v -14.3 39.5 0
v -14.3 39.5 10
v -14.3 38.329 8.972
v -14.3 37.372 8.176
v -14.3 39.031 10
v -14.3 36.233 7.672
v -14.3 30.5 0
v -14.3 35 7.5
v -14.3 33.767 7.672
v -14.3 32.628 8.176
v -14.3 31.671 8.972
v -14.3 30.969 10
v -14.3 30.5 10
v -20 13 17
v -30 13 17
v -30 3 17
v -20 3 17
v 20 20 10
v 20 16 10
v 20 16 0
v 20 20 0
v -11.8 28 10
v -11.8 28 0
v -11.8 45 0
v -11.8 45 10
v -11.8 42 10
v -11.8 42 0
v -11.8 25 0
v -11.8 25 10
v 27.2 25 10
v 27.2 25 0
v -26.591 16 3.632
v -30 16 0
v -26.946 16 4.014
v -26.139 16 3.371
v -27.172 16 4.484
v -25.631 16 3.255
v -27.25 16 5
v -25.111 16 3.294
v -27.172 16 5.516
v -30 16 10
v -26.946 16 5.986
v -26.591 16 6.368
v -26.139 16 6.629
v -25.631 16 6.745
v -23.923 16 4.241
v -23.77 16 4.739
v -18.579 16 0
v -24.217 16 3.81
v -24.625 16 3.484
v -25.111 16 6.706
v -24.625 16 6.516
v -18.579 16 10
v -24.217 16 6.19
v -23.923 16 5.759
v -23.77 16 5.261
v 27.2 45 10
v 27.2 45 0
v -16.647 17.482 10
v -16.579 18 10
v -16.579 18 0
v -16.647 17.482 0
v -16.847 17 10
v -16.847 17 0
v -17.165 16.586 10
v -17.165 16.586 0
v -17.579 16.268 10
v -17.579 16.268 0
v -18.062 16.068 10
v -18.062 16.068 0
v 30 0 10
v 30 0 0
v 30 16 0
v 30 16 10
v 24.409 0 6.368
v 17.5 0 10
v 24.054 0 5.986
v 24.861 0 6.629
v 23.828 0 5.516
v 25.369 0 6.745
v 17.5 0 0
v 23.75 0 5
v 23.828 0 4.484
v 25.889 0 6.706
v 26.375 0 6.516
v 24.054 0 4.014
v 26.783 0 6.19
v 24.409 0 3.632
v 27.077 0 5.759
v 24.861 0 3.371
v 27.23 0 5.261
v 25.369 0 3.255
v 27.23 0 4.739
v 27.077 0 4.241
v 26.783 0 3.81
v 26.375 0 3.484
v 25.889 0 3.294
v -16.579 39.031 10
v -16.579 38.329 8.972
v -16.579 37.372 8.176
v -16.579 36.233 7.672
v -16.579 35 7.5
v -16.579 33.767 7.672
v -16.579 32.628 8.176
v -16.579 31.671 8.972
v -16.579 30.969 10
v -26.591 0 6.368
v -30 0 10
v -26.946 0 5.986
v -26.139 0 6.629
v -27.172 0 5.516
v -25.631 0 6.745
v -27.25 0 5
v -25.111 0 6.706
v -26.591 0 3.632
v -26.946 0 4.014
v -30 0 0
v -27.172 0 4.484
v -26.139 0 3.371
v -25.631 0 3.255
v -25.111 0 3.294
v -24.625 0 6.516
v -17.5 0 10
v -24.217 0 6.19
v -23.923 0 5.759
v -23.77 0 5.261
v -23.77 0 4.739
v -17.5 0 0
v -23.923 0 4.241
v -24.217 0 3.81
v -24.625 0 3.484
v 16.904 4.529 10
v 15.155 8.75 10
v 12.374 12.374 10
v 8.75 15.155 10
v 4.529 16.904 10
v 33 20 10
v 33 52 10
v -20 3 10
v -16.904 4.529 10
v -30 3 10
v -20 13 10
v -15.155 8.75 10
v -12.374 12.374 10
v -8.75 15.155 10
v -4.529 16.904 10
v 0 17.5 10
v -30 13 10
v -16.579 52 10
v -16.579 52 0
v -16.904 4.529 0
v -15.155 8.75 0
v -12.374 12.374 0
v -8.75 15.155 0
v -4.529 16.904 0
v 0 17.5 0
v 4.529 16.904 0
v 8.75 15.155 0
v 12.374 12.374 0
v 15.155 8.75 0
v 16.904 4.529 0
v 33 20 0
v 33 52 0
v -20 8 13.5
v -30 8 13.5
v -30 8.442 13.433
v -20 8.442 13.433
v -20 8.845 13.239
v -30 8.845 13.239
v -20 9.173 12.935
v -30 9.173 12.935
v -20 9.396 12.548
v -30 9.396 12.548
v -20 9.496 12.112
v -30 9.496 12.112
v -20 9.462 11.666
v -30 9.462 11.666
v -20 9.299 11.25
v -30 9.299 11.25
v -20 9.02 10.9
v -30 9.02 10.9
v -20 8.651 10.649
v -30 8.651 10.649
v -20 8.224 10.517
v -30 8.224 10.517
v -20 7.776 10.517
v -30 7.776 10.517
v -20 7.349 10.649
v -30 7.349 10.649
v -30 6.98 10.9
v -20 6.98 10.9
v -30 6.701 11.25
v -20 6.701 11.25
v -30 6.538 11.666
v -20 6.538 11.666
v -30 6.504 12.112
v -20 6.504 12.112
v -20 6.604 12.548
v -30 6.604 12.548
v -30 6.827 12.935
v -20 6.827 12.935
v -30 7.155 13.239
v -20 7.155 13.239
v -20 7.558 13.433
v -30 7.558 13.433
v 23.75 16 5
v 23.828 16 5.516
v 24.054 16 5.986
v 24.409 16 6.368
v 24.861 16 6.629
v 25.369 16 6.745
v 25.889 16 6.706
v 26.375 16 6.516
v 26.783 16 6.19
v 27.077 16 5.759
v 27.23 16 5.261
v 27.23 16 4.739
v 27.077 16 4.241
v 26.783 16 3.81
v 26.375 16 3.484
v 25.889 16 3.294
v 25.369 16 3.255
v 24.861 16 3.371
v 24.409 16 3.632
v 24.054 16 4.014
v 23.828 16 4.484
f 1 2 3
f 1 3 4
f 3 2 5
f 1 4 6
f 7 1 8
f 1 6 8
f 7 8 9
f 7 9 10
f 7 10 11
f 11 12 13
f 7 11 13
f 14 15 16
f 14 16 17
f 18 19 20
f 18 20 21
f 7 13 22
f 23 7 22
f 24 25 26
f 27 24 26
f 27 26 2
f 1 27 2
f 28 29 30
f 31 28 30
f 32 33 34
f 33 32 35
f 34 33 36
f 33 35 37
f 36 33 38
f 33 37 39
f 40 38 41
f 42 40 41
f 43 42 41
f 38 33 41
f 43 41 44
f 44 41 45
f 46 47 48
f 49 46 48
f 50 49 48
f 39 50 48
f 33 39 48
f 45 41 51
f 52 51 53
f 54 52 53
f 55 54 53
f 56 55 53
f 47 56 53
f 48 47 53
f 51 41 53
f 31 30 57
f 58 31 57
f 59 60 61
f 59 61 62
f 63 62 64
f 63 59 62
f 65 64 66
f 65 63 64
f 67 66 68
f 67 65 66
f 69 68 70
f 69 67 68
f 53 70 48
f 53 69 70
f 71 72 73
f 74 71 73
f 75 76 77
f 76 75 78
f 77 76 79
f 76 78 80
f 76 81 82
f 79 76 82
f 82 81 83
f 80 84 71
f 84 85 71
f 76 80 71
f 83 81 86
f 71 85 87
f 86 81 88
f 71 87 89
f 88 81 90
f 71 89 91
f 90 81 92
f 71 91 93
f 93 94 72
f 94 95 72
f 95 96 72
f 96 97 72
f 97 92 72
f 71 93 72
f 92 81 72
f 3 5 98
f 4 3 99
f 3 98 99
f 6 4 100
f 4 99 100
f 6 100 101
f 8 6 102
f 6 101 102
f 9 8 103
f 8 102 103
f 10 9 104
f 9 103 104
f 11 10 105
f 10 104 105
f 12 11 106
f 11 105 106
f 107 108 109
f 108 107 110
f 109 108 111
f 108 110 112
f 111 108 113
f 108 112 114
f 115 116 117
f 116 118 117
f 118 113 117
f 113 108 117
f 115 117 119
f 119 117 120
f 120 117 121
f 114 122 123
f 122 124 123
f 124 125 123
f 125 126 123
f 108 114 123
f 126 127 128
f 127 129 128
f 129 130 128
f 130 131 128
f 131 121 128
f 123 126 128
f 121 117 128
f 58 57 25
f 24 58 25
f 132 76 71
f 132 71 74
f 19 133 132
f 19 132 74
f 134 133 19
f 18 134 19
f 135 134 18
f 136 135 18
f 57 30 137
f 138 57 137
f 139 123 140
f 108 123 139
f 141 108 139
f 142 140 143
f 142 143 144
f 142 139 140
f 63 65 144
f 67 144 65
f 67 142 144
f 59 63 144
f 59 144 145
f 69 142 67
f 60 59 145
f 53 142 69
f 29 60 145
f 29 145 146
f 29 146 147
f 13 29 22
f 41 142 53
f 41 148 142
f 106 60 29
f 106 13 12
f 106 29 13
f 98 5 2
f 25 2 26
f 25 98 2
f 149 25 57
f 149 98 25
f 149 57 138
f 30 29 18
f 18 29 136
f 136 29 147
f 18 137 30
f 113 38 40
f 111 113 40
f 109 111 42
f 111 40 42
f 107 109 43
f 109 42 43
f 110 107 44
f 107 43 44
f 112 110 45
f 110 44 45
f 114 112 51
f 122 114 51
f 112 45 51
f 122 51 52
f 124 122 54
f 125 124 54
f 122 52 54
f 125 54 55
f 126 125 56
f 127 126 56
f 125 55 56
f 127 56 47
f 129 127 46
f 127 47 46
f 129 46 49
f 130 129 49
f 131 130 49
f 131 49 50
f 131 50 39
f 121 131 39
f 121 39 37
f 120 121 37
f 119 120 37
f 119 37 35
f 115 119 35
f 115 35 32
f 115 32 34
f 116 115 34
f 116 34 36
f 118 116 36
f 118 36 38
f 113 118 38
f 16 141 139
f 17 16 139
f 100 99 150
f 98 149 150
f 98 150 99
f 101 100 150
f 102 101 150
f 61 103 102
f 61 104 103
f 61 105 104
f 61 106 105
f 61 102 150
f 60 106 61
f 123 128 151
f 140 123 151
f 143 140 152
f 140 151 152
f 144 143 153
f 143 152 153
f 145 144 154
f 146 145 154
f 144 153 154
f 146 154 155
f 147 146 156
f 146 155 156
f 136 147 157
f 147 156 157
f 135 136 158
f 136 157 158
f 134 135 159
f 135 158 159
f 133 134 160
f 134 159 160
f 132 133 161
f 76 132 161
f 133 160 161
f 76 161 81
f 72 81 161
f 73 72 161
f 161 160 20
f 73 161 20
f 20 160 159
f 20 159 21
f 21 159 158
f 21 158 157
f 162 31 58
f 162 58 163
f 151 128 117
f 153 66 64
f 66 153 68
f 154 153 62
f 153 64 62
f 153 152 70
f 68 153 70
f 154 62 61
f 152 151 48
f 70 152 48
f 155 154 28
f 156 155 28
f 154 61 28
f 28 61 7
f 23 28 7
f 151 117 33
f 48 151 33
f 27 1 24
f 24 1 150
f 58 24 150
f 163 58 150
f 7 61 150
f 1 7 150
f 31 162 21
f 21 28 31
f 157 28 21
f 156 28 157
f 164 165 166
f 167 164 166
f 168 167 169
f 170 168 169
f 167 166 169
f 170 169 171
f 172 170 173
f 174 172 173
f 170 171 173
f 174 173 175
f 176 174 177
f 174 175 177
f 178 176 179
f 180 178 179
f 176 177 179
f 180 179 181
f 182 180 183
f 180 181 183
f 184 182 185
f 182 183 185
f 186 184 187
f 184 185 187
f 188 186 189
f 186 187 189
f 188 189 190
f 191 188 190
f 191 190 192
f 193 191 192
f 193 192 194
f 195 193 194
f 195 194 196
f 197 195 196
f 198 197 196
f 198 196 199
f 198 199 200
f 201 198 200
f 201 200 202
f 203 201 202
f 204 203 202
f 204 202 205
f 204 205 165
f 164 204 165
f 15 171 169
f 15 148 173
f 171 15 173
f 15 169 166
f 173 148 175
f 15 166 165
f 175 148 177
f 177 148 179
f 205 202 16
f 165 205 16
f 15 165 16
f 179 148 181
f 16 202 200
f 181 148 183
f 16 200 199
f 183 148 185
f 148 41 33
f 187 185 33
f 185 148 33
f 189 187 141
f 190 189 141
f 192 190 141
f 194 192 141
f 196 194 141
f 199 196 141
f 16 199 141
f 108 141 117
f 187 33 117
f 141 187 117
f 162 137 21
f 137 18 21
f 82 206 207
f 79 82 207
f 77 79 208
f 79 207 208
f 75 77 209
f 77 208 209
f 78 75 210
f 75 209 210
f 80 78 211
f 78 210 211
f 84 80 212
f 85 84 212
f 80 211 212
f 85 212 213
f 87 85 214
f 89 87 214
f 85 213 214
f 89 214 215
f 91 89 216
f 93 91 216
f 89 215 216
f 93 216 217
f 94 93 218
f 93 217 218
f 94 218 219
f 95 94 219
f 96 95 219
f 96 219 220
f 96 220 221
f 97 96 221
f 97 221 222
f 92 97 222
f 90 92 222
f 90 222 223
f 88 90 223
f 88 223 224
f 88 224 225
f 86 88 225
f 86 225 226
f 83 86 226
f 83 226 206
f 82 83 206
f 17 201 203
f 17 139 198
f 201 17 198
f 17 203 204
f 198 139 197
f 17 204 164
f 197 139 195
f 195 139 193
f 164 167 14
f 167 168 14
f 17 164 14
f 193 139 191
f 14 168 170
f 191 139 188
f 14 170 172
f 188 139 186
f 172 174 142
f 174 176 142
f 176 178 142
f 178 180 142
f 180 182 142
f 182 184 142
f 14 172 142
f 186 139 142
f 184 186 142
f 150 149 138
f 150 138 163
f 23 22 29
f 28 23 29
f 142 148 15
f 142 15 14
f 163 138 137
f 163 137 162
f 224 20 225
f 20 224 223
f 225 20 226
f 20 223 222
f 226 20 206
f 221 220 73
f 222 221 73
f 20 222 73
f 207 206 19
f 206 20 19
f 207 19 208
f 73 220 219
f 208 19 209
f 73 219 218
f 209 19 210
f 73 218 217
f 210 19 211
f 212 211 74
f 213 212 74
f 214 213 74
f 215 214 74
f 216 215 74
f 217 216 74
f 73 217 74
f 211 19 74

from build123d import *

# Parameters (mm, degrees)
Y_KSEKLIK_EKSTR_ZYON1_DEPTH = 10
CUT_EXTRUDE1_REACH          = 62.86
SKETCH1_W                   = 10
SKETCH1_H                   = 4
SKETCH1_H_2                 = 36
CUT_EXTRUDE2_REACH          = 49.917
SKETCH2_R                   = 1.75
SKETCH3_W                   = 10
SKETCH3_H                   = 10
BOSS_EXTRUDE1_DEPTH         = 7
CUT_EXTRUDE3_REACH          = 83.197
SKETCH4_R                   = 1.5
CUT_EXTRUDE4_REACH          = 62.86
CUT_EXTRUDE5_REACH          = 73.851
SKETCH7_R                   = 4.5
SKETCH8_W                   = 10
SKETCH8_H                   = 32
BOSS_EXTRUDE2_DEPTH         = 3


with BuildPart() as part:
    # Çizim1 → Yükseklik-Ekstrüzyon1 (new body)
    with BuildSketch(Plane.XY):
        with BuildLine():
            Line((-30, 0), (-17.5, 0))
            ThreePointArc((-17.5, 0), (0, 17.5), (17.5, 0))
            Line((17.5, 0), (30, 0))
            Line((30, 0), (30, 52))
            Line((30, 52), (-30, 52))
            Line((-30, 52), (-30, 0))
        make_face()
    extrude(amount=Y_KSEKLIK_EKSTR_ZYON1_DEPTH)

    # Sketch1 → Cut-Extrude1 (cut, up to next)
    with BuildSketch(Plane.XY.offset(10), mode=Mode.PRIVATE) as cut_extrude1_sk1:
        with Locations((25, 18)):
            Rectangle(SKETCH1_W, SKETCH1_H)
    cut_extrude1_tool1 = extrude(cut_extrude1_sk1.sketch, amount=-CUT_EXTRUDE1_REACH, mode=Mode.PRIVATE) & part.part
    # Sketch1 → Cut-Extrude1 (cut, up to next)
    with BuildSketch(Plane.XY.offset(10), mode=Mode.PRIVATE) as cut_extrude1_sk2:
        with Locations((-25, 34)):
            Rectangle(SKETCH1_W, SKETCH1_H_2)
    cut_extrude1_tool2 = extrude(cut_extrude1_sk2.sketch, amount=-CUT_EXTRUDE1_REACH, mode=Mode.PRIVATE) & part.part
    add(cut_extrude1_tool1.solids().sort_by_distance((25, 18, 10))[0], mode=Mode.SUBTRACT)
    add(cut_extrude1_tool2.solids().sort_by_distance((-25, 34, 10))[0], mode=Mode.SUBTRACT)

    # Sketch2 → Cut-Extrude2 (cut, up to next)
    with BuildSketch(Plane(origin=(0, 16, 0), x_dir=(1, 0, 0), z_dir=(0, 1, 0)), mode=Mode.PRIVATE) as cut_extrude2_sk1:
        with Locations(Location((-25.5, -5, 0), (0, 0, 180))):
            Circle(SKETCH2_R)
    cut_extrude2_tool1 = extrude(cut_extrude2_sk1.sketch, amount=-CUT_EXTRUDE2_REACH, mode=Mode.PRIVATE) & part.part
    # Sketch2 → Cut-Extrude2 (cut, up to next)
    with BuildSketch(Plane(origin=(0, 16, 0), x_dir=(1, 0, 0), z_dir=(0, 1, 0)), mode=Mode.PRIVATE) as cut_extrude2_sk2:
        with Locations(Location((25.5, -5, 0), (0, 0, 180))):
            Circle(SKETCH2_R)
    cut_extrude2_tool2 = extrude(cut_extrude2_sk2.sketch, amount=-CUT_EXTRUDE2_REACH, mode=Mode.PRIVATE) & part.part
    add(cut_extrude2_tool1.solids().sort_by_distance((-25.5, 16, 5))[0], mode=Mode.SUBTRACT)
    add(cut_extrude2_tool2.solids().sort_by_distance((25.5, 16, 5))[0], mode=Mode.SUBTRACT)

    # Sketch3 → Boss-Extrude1 (add)
    with BuildSketch(Plane.XY.offset(10)):
        with Locations((-25, 8)):
            Rectangle(SKETCH3_W, SKETCH3_H)
    extrude(amount=BOSS_EXTRUDE1_DEPTH)

    # Sketch4 → Cut-Extrude3 (cut, up to next)
    with BuildSketch(Plane.ZY.offset(30), mode=Mode.PRIVATE) as cut_extrude3_sk1:
        with Locations((12, 8)):
            Circle(SKETCH4_R)
    cut_extrude3_tool1 = extrude(cut_extrude3_sk1.sketch, amount=-CUT_EXTRUDE3_REACH, mode=Mode.PRIVATE) & part.part
    add(cut_extrude3_tool1.solids().sort_by_distance((-30, 8, 12))[0], mode=Mode.SUBTRACT)

    # Sketch6 → Cut-Extrude4 (cut, up to next)
    with BuildSketch(Plane.XY.offset(10), mode=Mode.PRIVATE) as cut_extrude4_sk1:
        with BuildLine():
            Line((-20, 52), (-16.579251378, 52))
            Line((-16.579251378, 52), (-16.579251378, 18))
            ThreePointArc((-16.579251378, 18), (-17.165037815, 16.585786438), (-18.579251378, 16))
            Line((-18.579251378, 16), (-20, 16))
            Line((-20, 16), (-20, 52))
        make_face()
    cut_extrude4_tool1 = extrude(cut_extrude4_sk1.sketch, amount=-CUT_EXTRUDE4_REACH, mode=Mode.PRIVATE) & part.part
    # Sketch6 → Cut-Extrude4 (cut, up to next)
    with BuildSketch(Plane.XY.offset(10), mode=Mode.PRIVATE) as cut_extrude4_sk2:
        Polygon((27.2, 45), (-11.8, 45), (-11.8, 42), (-14.3, 39.5), (-14.3, 30.5), (-11.8, 28), (-11.8, 25), (27.2, 25), align=None)
    cut_extrude4_tool2 = extrude(cut_extrude4_sk2.sketch, amount=-CUT_EXTRUDE4_REACH, mode=Mode.PRIVATE) & part.part
    add(cut_extrude4_tool1.solids().sort_by_distance((-18.298496, 34.123216, 10))[0], mode=Mode.SUBTRACT)
    add(cut_extrude4_tool2.solids().sort_by_distance((6.965585, 35, 10))[0], mode=Mode.SUBTRACT)

    # Sketch7 → Cut-Extrude5 (cut, up to next)
    with BuildSketch(Plane.ZY.offset(16.579251378), mode=Mode.PRIVATE) as cut_extrude5_sk1:
        with Locations((12, 35)):
            Circle(SKETCH7_R)
    cut_extrude5_tool1 = extrude(cut_extrude5_sk1.sketch, amount=-CUT_EXTRUDE5_REACH, mode=Mode.PRIVATE) & part.part
    add(cut_extrude5_tool1.solids().sort_by_distance((-16.579251, 35, 12))[0], mode=Mode.SUBTRACT)

    # Sketch8 → Boss-Extrude2 (add)
    with BuildSketch(Plane(origin=(30, 0, 0), x_dir=(0, 0, -1), z_dir=(1, 0, 0))):
        with Locations((-5, 36)):
            Rectangle(SKETCH8_W, SKETCH8_H)
    extrude(amount=BOSS_EXTRUDE2_DEPTH)


solid = part.part
